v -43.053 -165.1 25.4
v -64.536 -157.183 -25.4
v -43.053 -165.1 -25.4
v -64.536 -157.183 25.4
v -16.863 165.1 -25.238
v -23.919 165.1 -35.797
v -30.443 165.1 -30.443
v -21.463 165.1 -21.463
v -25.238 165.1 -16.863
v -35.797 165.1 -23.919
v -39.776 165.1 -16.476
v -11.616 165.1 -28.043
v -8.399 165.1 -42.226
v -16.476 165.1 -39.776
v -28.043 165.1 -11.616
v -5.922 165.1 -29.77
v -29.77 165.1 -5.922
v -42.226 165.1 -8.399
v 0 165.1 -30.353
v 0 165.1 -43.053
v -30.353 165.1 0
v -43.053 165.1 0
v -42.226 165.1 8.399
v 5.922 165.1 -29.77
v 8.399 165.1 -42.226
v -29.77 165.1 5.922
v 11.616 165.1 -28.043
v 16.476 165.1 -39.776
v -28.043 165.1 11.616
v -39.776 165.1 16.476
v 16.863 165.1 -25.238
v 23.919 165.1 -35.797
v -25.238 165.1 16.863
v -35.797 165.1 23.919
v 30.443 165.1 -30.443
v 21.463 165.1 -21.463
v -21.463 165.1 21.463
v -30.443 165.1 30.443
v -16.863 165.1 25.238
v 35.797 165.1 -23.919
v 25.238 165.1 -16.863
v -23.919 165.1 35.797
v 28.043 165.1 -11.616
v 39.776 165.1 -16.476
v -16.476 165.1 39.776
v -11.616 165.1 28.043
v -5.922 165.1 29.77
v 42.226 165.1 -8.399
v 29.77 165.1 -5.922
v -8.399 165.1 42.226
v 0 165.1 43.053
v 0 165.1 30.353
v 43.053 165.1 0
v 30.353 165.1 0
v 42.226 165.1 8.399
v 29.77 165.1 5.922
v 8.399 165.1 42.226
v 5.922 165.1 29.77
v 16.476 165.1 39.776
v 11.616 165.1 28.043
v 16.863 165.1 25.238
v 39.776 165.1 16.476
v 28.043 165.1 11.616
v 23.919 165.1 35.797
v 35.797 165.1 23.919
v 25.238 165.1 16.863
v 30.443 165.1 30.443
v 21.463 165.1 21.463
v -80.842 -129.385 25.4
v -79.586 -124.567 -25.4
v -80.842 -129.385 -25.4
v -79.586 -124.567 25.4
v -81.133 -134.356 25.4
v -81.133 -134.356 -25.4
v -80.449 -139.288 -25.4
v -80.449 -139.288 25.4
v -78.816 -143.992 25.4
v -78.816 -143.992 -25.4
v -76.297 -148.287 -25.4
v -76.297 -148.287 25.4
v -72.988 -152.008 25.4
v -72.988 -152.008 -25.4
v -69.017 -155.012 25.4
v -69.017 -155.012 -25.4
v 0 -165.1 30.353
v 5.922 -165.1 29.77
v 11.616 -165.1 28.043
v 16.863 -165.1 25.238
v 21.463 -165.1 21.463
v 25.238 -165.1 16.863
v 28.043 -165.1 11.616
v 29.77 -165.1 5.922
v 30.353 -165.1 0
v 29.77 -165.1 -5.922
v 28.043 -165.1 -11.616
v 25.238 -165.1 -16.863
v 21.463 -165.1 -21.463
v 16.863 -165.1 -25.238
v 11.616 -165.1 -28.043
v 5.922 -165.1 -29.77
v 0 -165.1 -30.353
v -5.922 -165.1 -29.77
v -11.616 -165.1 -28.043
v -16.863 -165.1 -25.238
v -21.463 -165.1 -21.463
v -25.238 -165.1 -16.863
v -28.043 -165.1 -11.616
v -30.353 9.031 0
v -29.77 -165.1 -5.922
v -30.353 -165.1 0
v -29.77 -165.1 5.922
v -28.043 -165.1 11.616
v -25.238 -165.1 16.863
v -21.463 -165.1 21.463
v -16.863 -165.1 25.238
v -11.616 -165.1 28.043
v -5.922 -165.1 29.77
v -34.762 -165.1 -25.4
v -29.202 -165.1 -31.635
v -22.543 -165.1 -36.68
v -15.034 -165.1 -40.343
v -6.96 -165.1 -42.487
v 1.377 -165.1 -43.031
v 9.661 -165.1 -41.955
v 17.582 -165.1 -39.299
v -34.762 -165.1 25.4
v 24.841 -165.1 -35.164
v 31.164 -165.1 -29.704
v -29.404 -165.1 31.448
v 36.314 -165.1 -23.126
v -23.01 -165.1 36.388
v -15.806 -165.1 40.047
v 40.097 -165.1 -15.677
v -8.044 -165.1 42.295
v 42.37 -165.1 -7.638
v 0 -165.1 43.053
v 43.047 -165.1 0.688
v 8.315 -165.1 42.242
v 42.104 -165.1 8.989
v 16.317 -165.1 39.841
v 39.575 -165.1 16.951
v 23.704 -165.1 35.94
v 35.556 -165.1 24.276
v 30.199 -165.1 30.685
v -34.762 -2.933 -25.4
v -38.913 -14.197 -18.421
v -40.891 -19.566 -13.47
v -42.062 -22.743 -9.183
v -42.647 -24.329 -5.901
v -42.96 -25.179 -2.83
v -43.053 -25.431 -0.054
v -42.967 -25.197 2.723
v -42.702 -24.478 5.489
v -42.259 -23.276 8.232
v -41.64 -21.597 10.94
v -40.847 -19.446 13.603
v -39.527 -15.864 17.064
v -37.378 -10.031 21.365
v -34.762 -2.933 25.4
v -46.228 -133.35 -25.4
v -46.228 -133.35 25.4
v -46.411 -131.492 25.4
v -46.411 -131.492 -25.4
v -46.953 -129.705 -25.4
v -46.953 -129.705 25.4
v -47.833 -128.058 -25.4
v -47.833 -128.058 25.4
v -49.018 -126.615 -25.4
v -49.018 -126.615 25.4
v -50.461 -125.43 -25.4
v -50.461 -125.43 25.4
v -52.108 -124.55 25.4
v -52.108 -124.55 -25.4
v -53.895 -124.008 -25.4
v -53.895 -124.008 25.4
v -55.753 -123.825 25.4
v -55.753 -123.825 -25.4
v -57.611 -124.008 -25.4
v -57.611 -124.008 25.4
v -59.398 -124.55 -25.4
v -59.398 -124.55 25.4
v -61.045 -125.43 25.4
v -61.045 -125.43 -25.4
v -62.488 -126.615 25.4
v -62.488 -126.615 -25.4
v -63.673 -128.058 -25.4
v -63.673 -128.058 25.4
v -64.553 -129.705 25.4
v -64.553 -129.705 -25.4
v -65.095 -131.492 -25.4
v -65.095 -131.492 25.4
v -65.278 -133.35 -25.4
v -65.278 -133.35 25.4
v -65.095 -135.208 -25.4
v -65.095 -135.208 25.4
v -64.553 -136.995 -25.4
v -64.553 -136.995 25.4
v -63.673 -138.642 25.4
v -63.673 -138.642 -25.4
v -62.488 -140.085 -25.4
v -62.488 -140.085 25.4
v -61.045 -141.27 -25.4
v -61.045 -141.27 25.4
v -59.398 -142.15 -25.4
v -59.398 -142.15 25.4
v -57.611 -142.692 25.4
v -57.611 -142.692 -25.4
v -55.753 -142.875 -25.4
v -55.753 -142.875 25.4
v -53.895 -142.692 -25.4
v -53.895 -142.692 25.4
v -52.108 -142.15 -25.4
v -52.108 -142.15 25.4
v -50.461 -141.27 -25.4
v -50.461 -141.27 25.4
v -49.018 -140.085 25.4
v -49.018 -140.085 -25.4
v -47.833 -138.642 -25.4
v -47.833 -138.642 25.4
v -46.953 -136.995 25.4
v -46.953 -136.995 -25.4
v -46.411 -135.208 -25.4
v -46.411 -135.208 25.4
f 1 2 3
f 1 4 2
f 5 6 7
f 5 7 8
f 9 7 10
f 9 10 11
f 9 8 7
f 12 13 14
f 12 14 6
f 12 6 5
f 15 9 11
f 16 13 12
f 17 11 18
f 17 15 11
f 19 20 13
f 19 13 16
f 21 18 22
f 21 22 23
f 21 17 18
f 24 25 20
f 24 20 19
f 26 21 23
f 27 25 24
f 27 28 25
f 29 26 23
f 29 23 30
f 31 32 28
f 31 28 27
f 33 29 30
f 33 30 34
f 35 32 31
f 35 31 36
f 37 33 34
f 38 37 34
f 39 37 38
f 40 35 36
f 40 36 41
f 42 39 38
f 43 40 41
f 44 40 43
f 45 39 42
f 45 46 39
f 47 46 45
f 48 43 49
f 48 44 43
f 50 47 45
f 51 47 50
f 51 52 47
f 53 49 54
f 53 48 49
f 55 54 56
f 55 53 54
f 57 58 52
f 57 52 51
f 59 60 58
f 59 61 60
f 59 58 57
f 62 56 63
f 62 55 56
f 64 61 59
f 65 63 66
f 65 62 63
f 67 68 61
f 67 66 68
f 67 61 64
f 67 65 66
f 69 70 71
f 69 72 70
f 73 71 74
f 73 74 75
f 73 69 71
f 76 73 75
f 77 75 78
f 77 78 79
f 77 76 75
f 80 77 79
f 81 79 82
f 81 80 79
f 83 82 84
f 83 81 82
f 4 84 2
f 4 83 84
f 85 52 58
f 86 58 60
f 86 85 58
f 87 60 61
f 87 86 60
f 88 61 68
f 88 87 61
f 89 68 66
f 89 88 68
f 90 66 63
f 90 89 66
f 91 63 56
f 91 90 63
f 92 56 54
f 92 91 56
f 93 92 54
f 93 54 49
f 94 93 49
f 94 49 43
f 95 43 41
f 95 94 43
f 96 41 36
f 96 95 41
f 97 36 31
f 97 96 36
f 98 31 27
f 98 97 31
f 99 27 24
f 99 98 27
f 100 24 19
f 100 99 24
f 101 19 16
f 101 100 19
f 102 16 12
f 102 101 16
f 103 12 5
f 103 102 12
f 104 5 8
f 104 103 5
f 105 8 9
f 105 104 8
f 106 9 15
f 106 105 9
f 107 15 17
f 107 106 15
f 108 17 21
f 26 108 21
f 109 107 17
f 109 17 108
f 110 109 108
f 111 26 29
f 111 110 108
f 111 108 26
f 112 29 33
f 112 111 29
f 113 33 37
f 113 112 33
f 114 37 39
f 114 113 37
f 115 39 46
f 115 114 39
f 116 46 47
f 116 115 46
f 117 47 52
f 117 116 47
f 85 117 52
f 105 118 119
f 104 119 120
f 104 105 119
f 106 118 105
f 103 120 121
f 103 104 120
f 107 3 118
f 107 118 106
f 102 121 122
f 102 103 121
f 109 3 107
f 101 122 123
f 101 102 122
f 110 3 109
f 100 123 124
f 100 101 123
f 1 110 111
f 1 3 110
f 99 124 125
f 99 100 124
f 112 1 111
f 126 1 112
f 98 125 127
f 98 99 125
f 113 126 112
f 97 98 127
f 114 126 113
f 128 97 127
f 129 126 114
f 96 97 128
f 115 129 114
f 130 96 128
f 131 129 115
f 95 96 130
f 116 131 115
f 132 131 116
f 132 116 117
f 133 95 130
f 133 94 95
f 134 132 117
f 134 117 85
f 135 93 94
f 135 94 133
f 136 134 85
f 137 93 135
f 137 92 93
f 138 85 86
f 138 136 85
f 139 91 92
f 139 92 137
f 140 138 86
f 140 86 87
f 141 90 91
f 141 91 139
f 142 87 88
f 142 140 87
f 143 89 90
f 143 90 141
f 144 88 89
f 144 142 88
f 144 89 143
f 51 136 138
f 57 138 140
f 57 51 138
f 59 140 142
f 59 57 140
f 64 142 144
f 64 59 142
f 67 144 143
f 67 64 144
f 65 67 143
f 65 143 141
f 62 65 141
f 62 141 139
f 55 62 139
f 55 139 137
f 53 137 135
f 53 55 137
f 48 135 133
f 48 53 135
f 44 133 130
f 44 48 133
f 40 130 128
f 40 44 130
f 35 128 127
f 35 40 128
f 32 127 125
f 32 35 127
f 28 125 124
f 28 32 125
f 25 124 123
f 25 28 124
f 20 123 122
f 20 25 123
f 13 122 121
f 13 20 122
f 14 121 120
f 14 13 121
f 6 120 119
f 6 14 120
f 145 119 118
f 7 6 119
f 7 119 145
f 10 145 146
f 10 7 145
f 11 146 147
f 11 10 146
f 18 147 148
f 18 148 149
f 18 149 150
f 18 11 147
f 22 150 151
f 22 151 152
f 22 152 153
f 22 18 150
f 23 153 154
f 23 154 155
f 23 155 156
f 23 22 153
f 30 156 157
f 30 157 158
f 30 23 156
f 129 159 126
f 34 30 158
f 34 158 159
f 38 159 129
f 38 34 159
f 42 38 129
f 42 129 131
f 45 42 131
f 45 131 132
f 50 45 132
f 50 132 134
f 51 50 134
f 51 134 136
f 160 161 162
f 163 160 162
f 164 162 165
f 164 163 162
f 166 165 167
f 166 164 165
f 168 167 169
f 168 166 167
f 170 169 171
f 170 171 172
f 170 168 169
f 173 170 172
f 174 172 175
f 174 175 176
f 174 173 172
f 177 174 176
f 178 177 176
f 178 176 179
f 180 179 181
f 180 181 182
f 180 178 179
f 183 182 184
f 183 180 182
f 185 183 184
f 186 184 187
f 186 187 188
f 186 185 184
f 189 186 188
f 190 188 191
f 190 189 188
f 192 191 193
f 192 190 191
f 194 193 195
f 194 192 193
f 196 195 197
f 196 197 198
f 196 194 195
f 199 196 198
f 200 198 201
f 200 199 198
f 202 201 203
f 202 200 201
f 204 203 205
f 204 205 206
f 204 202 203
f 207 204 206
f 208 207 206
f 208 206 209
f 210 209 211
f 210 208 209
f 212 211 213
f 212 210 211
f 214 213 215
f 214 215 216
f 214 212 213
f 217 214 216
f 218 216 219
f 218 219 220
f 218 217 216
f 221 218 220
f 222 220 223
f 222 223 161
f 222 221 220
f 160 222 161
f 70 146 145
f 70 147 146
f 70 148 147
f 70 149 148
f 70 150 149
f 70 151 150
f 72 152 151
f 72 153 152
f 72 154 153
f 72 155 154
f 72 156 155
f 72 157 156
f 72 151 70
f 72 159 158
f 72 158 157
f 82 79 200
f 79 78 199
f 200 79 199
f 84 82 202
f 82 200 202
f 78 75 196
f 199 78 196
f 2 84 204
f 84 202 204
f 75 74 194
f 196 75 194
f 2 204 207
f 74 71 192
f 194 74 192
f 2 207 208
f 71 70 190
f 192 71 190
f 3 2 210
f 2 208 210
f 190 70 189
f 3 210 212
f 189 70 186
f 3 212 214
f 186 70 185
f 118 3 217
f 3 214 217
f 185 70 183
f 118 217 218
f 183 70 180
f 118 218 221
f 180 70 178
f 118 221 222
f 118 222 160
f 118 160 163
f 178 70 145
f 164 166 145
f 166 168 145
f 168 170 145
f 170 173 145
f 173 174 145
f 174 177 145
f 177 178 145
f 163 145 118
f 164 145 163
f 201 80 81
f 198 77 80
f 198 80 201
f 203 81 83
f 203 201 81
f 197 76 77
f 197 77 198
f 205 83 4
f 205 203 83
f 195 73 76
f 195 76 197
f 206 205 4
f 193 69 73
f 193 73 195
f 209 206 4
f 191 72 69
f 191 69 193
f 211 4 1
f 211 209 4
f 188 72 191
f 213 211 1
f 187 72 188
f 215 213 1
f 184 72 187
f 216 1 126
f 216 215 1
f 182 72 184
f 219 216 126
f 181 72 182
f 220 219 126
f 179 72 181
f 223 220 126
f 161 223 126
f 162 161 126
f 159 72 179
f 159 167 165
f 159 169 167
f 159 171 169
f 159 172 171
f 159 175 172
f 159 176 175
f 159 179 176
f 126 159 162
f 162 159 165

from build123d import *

# Parameters (mm, degrees)
SKETCH1_R           = 43.053
SKETCH1_R_2         = 30.353
BOSS_EXTRUDE1_DEPTH = 165.1
SKETCH2_R           = 9.525
BOSS_EXTRUDE2_DEPTH = 25.4


with BuildPart() as part:
    # Sketch1 → Boss-Extrude1 (new, symmetric)
    with BuildSketch(Plane(origin=(0, 0, 0), x_dir=(1, 0, 0), z_dir=(0, 1, 0))):
        with Locations(Location((0, 0, 0), (0, 0, 270))):
            Circle(SKETCH1_R)
        with Locations(Location((0, 0, 0), (0, 0, 270))):
            Circle(SKETCH1_R_2, mode=Mode.SUBTRACT)
    extrude(amount=BOSS_EXTRUDE1_DEPTH, both=True)

    # Sketch2 → Boss-Extrude2 (add, symmetric)
    with BuildSketch(Plane.XY):
        with BuildLine():
            Line((-64.535931448, -157.183172579), (-43.053, -165.1))
            Line((-43.053, -165.1), (-30.353, -165.1))
            Line((-30.353, -165.1), (-30.353, 9.031002397))
            Line((-30.353, 9.031002397), (-79.586172579, -124.567068552))
            ThreePointArc((-79.586172579, -124.567068552), (-78.816068333, -143.992127562), (-64.535931448, -157.183172579))
        make_face()
        with Locations((-55.753, -133.35)):
            Circle(SKETCH2_R, mode=Mode.SUBTRACT)
    extrude(amount=BOSS_EXTRUDE2_DEPTH, both=True)


solid = part.part
